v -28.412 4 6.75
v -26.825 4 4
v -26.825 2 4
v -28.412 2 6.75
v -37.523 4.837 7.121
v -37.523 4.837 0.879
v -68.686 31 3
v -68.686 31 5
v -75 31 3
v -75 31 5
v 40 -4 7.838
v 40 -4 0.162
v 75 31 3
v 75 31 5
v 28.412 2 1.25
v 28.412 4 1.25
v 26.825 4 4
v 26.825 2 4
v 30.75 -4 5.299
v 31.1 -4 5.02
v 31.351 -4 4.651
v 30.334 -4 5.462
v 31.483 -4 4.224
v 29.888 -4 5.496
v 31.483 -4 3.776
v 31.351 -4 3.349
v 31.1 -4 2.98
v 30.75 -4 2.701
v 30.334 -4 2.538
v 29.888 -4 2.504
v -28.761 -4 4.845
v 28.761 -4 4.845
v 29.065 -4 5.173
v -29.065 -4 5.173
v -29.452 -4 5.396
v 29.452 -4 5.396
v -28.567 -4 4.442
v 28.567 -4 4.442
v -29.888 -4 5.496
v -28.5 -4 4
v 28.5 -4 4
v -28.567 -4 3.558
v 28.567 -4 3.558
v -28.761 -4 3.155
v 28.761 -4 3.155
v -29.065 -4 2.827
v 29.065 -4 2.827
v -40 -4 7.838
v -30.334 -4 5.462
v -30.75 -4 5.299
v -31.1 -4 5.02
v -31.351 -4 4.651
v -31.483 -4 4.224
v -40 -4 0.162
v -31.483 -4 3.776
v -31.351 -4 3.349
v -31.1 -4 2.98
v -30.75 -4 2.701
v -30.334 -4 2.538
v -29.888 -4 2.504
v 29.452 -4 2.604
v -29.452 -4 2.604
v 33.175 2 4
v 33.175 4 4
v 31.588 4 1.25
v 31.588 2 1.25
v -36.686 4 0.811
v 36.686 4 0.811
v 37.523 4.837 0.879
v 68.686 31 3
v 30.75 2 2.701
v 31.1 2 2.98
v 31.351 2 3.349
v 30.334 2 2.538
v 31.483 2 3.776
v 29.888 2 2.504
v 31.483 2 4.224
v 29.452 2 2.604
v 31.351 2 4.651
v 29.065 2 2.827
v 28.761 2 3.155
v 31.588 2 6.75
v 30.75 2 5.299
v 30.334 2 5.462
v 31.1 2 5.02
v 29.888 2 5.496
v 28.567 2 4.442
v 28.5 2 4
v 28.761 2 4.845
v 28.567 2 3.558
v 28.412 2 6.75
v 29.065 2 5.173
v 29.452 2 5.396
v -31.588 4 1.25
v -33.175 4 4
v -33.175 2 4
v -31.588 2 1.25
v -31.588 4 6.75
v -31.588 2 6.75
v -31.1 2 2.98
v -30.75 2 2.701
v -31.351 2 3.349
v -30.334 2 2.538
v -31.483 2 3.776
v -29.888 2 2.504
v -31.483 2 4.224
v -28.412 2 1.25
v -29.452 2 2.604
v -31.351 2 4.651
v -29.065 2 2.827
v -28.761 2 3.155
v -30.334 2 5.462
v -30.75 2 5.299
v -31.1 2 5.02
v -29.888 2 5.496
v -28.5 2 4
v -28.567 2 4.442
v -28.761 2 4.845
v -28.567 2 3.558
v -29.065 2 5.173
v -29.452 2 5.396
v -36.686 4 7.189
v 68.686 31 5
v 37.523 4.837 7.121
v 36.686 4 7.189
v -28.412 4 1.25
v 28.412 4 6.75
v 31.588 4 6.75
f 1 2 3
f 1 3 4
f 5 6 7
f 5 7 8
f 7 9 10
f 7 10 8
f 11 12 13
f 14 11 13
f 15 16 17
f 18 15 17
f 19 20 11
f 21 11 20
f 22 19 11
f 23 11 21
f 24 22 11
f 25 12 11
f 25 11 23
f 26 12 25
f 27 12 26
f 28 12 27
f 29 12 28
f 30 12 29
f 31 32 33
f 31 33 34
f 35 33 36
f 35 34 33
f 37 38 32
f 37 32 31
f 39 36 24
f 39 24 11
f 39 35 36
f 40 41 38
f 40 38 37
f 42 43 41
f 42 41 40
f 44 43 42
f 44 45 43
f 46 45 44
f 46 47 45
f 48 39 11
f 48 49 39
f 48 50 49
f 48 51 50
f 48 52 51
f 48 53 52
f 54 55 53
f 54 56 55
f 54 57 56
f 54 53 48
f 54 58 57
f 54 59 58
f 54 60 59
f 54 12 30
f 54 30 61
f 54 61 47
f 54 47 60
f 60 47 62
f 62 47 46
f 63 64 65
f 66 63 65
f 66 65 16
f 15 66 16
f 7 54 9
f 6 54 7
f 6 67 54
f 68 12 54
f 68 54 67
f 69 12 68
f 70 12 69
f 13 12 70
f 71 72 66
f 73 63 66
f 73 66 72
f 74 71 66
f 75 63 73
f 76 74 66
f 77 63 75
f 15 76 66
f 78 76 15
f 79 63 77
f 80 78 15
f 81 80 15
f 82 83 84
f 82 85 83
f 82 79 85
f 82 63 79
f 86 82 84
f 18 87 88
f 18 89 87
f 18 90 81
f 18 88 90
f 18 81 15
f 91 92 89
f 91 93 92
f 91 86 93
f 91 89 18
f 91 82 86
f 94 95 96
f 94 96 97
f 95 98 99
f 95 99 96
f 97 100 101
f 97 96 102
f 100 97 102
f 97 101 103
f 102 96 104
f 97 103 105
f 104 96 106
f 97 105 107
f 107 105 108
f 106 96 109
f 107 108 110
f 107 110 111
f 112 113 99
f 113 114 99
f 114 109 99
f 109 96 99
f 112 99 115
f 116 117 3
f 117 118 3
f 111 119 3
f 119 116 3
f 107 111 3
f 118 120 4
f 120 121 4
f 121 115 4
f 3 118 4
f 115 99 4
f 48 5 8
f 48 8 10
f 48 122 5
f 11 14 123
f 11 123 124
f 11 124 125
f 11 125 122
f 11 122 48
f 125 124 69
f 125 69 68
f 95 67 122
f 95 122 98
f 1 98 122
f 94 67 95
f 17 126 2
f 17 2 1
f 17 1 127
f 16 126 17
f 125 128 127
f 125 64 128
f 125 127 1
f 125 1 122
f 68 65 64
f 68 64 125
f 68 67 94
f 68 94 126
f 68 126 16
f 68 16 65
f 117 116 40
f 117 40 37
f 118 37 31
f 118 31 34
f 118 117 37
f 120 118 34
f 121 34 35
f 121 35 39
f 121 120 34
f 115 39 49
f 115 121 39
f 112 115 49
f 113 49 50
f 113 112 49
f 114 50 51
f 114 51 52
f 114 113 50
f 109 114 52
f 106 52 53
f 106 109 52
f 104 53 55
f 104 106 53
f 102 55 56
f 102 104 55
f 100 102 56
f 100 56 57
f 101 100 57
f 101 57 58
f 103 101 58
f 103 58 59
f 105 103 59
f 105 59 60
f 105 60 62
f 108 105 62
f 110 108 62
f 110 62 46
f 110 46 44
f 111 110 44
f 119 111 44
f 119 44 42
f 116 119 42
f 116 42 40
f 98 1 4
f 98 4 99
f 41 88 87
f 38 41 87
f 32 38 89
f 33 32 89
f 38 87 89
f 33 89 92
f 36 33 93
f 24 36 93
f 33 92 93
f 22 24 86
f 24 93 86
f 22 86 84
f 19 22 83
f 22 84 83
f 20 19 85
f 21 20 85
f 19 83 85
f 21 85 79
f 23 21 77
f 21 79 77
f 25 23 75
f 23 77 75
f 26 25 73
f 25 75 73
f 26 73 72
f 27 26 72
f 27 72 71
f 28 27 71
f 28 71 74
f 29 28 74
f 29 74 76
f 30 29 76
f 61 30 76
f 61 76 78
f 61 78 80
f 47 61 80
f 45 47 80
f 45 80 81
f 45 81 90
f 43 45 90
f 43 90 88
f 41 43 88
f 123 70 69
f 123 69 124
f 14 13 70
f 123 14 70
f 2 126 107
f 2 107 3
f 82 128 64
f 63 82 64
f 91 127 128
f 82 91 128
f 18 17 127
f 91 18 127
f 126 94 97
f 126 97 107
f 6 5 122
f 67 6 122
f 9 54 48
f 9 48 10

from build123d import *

# Parameters (mm, degrees)
F1_DEPTH    = 8
F2_R        = 1.5
F3_DEPTH    = 8
F4_DEPTH    = 2
F5_SIZE2    = 5
F5_SIZE     = 37
F6_T1_DEPTH = 198.6904330104


# Not quite as in the source:
# - a fillet or chamfer that OpenCascade refuses, or shapes differently, is made with other operations: its cross-section is extruded or revolved along the edge and cut away or added


with BuildPart() as f1:
    # F0 (on Top) → F1 (new body)
    with BuildSketch(Plane.XY):
        Polygon((0, -4), (40, -4), (75, 31), (63.686291501, 31), (36.686291501, 4), (0, 4), align=None)
    extrude(amount=F1_DEPTH)

    # F2 (on face) → F3 (cut, through all)
    with BuildSketch(Plane(origin=(0, 4, 0), x_dir=(-1, 0, 0), z_dir=(0, 1, 0))):
        with Locations((-30, 4)):
            Circle(F2_R)
    extrude(amount=-F3_DEPTH, mode=Mode.SUBTRACT)

    # F2 (on face) → F4 (cut)
    with BuildSketch(Plane(origin=(0, 4, 0), x_dir=(-1, 0, 0), z_dir=(0, 1, 0))):
        Polygon((-28.4122867597, 1.25), (-26.8245735195, 4), (-28.4122867597, 6.75), (-31.5877132403, 6.75), (-33.1754264805, 4), (-31.5877132403, 1.25), align=None)
        with Locations((-30, 4)):
            Circle(F2_R, mode=Mode.SUBTRACT)
    extrude(amount=-F4_DEPTH, mode=Mode.SUBTRACT)

    # F5
    f5_edges = [f1.edges().sort_by_distance(p)[0] for p in [
        (63.686292, 31, 4),
    ]]
    f5_side = f1.faces().sort_by_distance((50.186292, 17.5, 4))[0]
    chamfer(f5_edges, length=F5_SIZE, length2=F5_SIZE2, reference=f5_side)

    # F6: chamfer of 37 x 3 on 2 edges, made by hand

    # F6_s2 → F6_t1 (cut)
    with BuildSketch(Plane.YZ.offset(-27.5020707547)):
        Polygon((-6, 0), (31, 3), (31, 0), align=None)
        Polygon((31, 5), (-6, 8), (31, 8), align=None)
    extrude(amount=F6_T1_DEPTH, mode=Mode.SUBTRACT)

    # F7: F1 across plane


with BuildPart() as f1_1:
    add(f1.part)
    add(f1.part.mirror(Plane.YZ))


solid = f1_1.part
